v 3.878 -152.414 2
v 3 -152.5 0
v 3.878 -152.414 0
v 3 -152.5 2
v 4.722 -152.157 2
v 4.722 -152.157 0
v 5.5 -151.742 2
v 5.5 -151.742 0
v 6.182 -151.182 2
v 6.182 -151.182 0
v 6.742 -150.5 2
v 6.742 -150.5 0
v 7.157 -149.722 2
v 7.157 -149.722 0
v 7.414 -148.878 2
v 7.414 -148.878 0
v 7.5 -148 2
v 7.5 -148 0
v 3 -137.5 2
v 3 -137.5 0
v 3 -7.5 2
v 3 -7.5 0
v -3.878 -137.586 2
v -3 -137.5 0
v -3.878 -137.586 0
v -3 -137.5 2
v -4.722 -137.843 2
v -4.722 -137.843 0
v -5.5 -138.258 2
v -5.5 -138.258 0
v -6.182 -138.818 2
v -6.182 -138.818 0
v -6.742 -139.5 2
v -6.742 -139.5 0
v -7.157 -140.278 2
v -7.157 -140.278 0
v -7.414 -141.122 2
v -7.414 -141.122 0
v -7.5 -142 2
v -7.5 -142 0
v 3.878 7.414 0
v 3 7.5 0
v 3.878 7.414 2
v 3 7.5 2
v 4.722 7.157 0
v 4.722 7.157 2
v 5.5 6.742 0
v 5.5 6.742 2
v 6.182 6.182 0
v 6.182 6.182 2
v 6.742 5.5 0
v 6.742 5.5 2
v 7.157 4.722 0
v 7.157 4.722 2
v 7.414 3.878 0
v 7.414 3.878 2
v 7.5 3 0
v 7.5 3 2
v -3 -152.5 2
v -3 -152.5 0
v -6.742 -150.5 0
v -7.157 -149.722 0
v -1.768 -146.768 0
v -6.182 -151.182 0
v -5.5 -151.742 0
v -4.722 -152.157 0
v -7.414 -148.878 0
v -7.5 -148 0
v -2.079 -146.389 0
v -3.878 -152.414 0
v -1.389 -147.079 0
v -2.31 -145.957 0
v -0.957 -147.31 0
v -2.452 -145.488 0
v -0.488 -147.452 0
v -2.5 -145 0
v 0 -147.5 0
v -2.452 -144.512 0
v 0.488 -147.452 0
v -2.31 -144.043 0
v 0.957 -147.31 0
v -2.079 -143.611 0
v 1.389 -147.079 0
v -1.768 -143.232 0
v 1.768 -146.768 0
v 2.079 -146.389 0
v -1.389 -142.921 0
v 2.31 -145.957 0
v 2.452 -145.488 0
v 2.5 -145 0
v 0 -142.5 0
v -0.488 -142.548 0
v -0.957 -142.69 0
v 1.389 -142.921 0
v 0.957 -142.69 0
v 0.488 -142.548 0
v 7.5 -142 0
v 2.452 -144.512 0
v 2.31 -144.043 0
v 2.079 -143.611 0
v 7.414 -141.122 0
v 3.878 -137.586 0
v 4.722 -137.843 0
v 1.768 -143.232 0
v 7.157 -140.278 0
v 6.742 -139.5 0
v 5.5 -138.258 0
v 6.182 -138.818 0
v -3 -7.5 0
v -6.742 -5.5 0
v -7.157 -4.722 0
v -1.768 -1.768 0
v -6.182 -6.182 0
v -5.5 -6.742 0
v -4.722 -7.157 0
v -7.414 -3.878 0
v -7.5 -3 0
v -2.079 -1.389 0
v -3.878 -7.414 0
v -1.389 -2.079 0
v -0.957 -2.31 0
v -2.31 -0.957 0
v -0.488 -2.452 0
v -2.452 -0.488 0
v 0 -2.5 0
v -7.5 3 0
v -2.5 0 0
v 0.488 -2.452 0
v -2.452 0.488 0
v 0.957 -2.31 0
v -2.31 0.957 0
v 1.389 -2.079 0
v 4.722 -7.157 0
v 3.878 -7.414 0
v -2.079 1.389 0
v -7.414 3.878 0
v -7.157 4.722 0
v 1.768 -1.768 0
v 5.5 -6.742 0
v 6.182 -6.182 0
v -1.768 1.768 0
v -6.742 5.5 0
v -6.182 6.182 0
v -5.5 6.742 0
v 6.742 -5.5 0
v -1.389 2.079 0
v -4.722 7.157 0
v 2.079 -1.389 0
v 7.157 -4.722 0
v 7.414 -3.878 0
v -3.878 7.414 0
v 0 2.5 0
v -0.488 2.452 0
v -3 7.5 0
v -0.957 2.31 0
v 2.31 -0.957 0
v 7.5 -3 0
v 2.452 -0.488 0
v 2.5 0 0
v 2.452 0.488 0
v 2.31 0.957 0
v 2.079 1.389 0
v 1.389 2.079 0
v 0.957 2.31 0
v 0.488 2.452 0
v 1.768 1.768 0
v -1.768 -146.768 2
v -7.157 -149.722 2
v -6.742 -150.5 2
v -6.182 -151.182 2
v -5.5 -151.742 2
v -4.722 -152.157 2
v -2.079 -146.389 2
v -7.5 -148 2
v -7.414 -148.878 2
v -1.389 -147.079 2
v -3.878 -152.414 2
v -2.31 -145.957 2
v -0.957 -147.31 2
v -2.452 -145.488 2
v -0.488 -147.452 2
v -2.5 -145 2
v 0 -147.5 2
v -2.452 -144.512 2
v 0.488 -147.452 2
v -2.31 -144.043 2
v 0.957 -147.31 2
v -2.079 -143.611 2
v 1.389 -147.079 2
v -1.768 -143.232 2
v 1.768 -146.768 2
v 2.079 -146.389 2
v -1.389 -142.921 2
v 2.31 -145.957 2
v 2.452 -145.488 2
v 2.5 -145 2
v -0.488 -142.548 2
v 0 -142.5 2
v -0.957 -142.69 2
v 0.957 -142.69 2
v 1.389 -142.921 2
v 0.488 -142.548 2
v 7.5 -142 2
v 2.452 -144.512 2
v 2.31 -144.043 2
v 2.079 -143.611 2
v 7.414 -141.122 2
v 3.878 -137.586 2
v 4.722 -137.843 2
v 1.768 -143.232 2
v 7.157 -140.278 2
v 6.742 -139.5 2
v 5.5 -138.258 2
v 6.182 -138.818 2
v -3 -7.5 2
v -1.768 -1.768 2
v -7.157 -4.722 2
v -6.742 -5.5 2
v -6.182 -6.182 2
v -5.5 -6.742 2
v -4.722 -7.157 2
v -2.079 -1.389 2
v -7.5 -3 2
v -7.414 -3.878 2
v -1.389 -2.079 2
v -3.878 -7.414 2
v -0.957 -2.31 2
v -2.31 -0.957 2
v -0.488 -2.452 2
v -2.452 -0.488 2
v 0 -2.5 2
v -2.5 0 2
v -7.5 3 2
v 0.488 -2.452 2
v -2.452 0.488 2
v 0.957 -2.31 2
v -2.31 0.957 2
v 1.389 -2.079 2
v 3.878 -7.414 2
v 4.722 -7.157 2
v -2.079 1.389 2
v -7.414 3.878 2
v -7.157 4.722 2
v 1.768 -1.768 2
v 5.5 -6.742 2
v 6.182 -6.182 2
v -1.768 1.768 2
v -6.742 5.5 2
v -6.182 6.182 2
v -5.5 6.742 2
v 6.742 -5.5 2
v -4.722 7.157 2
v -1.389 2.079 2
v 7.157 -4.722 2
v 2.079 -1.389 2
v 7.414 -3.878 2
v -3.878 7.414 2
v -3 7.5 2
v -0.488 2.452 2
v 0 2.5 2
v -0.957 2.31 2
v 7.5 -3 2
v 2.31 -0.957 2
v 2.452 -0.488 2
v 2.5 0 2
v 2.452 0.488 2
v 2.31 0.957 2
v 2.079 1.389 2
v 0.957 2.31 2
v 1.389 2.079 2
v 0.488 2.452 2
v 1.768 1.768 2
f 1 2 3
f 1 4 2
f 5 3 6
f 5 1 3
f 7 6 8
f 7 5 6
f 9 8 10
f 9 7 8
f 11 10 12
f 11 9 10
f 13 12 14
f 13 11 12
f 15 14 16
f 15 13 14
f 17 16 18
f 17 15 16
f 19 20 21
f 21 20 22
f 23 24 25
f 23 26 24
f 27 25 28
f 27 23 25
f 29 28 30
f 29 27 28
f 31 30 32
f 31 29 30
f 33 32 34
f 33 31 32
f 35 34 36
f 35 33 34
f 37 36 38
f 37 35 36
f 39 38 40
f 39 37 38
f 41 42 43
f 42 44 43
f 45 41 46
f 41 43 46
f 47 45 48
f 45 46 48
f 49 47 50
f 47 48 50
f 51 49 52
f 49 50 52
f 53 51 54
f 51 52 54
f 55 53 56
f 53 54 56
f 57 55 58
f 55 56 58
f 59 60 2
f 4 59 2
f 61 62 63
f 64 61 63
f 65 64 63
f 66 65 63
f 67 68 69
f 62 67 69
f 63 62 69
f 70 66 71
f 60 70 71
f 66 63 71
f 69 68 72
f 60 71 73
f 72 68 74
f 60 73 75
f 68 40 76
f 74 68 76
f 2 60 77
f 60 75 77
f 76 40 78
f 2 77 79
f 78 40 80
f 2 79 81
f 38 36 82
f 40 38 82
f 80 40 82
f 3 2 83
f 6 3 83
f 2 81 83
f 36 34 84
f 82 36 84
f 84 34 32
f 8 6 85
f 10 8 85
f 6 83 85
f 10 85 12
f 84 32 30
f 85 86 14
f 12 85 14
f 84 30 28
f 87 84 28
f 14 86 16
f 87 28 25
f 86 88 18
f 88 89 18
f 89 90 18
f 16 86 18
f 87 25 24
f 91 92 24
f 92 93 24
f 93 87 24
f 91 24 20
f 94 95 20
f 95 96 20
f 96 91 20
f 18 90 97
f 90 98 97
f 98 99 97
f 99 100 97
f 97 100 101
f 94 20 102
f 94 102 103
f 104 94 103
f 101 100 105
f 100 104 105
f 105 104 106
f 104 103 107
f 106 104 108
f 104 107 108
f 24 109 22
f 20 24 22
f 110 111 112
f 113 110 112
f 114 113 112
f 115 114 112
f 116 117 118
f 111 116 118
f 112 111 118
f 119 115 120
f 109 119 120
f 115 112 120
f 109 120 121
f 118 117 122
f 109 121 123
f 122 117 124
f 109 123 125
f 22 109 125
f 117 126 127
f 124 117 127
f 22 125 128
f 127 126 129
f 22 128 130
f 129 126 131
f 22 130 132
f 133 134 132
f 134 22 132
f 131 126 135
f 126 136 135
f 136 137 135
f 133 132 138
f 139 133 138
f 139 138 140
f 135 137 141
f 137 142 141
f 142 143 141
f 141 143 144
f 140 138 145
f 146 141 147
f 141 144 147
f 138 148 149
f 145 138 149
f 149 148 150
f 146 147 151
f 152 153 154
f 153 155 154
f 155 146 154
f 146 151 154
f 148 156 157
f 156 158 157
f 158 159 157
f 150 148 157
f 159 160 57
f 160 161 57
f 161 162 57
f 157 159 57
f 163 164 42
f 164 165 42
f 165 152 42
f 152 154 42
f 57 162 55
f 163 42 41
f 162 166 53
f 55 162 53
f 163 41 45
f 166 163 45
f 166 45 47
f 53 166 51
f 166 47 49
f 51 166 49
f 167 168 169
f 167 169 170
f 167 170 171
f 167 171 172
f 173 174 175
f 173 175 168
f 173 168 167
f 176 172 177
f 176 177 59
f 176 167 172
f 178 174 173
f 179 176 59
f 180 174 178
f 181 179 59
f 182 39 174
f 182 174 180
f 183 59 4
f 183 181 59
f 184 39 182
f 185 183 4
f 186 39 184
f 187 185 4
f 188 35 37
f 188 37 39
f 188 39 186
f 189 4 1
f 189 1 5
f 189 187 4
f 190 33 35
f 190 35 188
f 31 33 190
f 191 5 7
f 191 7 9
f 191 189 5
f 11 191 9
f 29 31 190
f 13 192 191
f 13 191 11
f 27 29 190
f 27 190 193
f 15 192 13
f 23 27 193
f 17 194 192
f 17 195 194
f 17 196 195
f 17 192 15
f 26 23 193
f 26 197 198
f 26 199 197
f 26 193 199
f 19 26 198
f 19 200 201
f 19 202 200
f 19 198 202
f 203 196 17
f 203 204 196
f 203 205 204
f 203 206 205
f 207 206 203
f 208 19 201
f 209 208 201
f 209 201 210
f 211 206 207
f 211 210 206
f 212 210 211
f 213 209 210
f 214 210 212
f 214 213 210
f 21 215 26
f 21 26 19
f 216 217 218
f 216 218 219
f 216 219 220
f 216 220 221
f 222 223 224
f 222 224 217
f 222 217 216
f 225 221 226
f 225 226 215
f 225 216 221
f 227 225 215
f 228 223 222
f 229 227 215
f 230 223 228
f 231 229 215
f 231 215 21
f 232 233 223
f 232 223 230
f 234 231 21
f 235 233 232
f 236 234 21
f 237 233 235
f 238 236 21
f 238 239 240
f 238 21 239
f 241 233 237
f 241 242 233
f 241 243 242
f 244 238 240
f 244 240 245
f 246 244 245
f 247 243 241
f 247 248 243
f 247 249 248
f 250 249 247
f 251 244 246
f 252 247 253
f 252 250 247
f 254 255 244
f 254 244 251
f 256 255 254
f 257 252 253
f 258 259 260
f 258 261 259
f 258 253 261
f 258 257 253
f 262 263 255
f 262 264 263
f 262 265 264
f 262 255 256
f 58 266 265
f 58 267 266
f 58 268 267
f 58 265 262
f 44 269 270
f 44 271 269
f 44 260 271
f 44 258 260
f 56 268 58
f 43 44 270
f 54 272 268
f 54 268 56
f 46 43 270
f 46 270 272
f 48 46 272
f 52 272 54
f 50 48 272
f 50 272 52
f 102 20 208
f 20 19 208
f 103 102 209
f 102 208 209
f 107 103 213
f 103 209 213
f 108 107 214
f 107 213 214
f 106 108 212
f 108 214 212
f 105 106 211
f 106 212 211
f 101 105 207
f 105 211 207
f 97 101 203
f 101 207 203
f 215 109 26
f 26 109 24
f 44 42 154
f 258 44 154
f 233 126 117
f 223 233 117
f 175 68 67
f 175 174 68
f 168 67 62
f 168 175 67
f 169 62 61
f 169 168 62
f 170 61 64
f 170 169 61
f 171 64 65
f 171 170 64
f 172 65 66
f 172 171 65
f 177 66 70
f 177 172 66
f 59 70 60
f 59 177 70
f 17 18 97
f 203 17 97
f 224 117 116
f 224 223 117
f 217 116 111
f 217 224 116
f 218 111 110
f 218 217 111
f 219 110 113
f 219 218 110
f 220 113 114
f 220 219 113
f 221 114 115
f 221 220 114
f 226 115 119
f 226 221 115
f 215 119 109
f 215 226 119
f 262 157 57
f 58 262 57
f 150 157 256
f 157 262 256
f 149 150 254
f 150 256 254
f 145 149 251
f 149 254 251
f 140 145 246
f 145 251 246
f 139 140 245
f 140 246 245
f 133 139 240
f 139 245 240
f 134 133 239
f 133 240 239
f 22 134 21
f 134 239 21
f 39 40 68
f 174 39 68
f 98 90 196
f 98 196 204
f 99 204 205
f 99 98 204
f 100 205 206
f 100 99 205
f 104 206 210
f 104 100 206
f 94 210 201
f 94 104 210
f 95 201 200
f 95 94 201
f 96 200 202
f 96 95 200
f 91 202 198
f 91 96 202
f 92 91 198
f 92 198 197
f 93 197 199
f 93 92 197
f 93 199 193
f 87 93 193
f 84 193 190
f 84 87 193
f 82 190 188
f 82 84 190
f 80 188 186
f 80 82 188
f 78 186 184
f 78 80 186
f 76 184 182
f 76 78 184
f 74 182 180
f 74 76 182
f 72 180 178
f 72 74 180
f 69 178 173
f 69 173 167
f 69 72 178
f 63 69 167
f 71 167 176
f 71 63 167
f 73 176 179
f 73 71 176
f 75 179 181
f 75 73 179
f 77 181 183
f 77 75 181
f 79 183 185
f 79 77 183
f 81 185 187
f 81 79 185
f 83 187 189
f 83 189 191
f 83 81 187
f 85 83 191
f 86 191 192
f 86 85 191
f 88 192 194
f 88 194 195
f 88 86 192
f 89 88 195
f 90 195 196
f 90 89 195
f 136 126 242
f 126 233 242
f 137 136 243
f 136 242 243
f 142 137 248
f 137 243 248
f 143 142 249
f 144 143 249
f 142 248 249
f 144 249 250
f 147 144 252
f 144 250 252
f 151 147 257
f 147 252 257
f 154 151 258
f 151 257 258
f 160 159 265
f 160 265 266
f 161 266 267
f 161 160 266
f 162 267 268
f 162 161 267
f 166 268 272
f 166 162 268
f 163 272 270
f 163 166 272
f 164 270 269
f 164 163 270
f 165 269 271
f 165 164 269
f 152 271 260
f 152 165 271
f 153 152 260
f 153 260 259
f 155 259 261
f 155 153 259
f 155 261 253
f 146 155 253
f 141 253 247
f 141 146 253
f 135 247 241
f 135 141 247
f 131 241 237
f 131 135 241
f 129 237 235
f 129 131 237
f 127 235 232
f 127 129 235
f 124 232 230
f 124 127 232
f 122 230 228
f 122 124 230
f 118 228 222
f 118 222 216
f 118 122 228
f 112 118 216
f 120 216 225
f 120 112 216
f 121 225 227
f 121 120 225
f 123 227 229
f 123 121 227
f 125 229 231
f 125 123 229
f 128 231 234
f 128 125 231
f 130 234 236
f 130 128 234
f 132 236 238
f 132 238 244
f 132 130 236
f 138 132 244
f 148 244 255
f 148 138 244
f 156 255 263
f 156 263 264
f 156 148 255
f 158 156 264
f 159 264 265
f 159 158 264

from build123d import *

# Parameters (mm, degrees)
SKETCH_1_R      = 2.5
EXTRUDE_1_DEPTH = 2
FILLET_1_R      = 4.5


with BuildPart() as part:
    # 草图1 → 凸台-拉伸1 (new body)
    with BuildSketch(Plane.XY):
        Polygon((-7.5, 7.5), (-7.5, -7.5), (-3, -7.5), (-3, -137.5), (-7.5, -137.5), (-7.5, -152.5), (7.5, -152.5), (7.5, -137.5), (3, -137.5), (3, -7.5), (7.5, -7.5), (7.5, 7.5), align=None)
        Circle(SKETCH_1_R, mode=Mode.SUBTRACT)
        with Locations((0, -145)):
            Circle(SKETCH_1_R, mode=Mode.SUBTRACT)
    extrude(amount=EXTRUDE_1_DEPTH)

    # 圆角1
    fillet_1_edges = [part.edges().sort_by_distance(p)[0] for p in [
        (-7.5, 7.5, 1),
        (-7.5, -7.5, 1),
        (7.5, -7.5, 1),
        (7.5, 7.5, 1),
        (7.5, -152.5, 1),
        (7.5, -137.5, 1),
        (-7.5, -152.5, 1),
        (-7.5, -137.5, 1),
    ]]
    fillet(fillet_1_edges, radius=FILLET_1_R - 0.0001)  # a hair under: the kernel refuses the full size


solid = part.part
